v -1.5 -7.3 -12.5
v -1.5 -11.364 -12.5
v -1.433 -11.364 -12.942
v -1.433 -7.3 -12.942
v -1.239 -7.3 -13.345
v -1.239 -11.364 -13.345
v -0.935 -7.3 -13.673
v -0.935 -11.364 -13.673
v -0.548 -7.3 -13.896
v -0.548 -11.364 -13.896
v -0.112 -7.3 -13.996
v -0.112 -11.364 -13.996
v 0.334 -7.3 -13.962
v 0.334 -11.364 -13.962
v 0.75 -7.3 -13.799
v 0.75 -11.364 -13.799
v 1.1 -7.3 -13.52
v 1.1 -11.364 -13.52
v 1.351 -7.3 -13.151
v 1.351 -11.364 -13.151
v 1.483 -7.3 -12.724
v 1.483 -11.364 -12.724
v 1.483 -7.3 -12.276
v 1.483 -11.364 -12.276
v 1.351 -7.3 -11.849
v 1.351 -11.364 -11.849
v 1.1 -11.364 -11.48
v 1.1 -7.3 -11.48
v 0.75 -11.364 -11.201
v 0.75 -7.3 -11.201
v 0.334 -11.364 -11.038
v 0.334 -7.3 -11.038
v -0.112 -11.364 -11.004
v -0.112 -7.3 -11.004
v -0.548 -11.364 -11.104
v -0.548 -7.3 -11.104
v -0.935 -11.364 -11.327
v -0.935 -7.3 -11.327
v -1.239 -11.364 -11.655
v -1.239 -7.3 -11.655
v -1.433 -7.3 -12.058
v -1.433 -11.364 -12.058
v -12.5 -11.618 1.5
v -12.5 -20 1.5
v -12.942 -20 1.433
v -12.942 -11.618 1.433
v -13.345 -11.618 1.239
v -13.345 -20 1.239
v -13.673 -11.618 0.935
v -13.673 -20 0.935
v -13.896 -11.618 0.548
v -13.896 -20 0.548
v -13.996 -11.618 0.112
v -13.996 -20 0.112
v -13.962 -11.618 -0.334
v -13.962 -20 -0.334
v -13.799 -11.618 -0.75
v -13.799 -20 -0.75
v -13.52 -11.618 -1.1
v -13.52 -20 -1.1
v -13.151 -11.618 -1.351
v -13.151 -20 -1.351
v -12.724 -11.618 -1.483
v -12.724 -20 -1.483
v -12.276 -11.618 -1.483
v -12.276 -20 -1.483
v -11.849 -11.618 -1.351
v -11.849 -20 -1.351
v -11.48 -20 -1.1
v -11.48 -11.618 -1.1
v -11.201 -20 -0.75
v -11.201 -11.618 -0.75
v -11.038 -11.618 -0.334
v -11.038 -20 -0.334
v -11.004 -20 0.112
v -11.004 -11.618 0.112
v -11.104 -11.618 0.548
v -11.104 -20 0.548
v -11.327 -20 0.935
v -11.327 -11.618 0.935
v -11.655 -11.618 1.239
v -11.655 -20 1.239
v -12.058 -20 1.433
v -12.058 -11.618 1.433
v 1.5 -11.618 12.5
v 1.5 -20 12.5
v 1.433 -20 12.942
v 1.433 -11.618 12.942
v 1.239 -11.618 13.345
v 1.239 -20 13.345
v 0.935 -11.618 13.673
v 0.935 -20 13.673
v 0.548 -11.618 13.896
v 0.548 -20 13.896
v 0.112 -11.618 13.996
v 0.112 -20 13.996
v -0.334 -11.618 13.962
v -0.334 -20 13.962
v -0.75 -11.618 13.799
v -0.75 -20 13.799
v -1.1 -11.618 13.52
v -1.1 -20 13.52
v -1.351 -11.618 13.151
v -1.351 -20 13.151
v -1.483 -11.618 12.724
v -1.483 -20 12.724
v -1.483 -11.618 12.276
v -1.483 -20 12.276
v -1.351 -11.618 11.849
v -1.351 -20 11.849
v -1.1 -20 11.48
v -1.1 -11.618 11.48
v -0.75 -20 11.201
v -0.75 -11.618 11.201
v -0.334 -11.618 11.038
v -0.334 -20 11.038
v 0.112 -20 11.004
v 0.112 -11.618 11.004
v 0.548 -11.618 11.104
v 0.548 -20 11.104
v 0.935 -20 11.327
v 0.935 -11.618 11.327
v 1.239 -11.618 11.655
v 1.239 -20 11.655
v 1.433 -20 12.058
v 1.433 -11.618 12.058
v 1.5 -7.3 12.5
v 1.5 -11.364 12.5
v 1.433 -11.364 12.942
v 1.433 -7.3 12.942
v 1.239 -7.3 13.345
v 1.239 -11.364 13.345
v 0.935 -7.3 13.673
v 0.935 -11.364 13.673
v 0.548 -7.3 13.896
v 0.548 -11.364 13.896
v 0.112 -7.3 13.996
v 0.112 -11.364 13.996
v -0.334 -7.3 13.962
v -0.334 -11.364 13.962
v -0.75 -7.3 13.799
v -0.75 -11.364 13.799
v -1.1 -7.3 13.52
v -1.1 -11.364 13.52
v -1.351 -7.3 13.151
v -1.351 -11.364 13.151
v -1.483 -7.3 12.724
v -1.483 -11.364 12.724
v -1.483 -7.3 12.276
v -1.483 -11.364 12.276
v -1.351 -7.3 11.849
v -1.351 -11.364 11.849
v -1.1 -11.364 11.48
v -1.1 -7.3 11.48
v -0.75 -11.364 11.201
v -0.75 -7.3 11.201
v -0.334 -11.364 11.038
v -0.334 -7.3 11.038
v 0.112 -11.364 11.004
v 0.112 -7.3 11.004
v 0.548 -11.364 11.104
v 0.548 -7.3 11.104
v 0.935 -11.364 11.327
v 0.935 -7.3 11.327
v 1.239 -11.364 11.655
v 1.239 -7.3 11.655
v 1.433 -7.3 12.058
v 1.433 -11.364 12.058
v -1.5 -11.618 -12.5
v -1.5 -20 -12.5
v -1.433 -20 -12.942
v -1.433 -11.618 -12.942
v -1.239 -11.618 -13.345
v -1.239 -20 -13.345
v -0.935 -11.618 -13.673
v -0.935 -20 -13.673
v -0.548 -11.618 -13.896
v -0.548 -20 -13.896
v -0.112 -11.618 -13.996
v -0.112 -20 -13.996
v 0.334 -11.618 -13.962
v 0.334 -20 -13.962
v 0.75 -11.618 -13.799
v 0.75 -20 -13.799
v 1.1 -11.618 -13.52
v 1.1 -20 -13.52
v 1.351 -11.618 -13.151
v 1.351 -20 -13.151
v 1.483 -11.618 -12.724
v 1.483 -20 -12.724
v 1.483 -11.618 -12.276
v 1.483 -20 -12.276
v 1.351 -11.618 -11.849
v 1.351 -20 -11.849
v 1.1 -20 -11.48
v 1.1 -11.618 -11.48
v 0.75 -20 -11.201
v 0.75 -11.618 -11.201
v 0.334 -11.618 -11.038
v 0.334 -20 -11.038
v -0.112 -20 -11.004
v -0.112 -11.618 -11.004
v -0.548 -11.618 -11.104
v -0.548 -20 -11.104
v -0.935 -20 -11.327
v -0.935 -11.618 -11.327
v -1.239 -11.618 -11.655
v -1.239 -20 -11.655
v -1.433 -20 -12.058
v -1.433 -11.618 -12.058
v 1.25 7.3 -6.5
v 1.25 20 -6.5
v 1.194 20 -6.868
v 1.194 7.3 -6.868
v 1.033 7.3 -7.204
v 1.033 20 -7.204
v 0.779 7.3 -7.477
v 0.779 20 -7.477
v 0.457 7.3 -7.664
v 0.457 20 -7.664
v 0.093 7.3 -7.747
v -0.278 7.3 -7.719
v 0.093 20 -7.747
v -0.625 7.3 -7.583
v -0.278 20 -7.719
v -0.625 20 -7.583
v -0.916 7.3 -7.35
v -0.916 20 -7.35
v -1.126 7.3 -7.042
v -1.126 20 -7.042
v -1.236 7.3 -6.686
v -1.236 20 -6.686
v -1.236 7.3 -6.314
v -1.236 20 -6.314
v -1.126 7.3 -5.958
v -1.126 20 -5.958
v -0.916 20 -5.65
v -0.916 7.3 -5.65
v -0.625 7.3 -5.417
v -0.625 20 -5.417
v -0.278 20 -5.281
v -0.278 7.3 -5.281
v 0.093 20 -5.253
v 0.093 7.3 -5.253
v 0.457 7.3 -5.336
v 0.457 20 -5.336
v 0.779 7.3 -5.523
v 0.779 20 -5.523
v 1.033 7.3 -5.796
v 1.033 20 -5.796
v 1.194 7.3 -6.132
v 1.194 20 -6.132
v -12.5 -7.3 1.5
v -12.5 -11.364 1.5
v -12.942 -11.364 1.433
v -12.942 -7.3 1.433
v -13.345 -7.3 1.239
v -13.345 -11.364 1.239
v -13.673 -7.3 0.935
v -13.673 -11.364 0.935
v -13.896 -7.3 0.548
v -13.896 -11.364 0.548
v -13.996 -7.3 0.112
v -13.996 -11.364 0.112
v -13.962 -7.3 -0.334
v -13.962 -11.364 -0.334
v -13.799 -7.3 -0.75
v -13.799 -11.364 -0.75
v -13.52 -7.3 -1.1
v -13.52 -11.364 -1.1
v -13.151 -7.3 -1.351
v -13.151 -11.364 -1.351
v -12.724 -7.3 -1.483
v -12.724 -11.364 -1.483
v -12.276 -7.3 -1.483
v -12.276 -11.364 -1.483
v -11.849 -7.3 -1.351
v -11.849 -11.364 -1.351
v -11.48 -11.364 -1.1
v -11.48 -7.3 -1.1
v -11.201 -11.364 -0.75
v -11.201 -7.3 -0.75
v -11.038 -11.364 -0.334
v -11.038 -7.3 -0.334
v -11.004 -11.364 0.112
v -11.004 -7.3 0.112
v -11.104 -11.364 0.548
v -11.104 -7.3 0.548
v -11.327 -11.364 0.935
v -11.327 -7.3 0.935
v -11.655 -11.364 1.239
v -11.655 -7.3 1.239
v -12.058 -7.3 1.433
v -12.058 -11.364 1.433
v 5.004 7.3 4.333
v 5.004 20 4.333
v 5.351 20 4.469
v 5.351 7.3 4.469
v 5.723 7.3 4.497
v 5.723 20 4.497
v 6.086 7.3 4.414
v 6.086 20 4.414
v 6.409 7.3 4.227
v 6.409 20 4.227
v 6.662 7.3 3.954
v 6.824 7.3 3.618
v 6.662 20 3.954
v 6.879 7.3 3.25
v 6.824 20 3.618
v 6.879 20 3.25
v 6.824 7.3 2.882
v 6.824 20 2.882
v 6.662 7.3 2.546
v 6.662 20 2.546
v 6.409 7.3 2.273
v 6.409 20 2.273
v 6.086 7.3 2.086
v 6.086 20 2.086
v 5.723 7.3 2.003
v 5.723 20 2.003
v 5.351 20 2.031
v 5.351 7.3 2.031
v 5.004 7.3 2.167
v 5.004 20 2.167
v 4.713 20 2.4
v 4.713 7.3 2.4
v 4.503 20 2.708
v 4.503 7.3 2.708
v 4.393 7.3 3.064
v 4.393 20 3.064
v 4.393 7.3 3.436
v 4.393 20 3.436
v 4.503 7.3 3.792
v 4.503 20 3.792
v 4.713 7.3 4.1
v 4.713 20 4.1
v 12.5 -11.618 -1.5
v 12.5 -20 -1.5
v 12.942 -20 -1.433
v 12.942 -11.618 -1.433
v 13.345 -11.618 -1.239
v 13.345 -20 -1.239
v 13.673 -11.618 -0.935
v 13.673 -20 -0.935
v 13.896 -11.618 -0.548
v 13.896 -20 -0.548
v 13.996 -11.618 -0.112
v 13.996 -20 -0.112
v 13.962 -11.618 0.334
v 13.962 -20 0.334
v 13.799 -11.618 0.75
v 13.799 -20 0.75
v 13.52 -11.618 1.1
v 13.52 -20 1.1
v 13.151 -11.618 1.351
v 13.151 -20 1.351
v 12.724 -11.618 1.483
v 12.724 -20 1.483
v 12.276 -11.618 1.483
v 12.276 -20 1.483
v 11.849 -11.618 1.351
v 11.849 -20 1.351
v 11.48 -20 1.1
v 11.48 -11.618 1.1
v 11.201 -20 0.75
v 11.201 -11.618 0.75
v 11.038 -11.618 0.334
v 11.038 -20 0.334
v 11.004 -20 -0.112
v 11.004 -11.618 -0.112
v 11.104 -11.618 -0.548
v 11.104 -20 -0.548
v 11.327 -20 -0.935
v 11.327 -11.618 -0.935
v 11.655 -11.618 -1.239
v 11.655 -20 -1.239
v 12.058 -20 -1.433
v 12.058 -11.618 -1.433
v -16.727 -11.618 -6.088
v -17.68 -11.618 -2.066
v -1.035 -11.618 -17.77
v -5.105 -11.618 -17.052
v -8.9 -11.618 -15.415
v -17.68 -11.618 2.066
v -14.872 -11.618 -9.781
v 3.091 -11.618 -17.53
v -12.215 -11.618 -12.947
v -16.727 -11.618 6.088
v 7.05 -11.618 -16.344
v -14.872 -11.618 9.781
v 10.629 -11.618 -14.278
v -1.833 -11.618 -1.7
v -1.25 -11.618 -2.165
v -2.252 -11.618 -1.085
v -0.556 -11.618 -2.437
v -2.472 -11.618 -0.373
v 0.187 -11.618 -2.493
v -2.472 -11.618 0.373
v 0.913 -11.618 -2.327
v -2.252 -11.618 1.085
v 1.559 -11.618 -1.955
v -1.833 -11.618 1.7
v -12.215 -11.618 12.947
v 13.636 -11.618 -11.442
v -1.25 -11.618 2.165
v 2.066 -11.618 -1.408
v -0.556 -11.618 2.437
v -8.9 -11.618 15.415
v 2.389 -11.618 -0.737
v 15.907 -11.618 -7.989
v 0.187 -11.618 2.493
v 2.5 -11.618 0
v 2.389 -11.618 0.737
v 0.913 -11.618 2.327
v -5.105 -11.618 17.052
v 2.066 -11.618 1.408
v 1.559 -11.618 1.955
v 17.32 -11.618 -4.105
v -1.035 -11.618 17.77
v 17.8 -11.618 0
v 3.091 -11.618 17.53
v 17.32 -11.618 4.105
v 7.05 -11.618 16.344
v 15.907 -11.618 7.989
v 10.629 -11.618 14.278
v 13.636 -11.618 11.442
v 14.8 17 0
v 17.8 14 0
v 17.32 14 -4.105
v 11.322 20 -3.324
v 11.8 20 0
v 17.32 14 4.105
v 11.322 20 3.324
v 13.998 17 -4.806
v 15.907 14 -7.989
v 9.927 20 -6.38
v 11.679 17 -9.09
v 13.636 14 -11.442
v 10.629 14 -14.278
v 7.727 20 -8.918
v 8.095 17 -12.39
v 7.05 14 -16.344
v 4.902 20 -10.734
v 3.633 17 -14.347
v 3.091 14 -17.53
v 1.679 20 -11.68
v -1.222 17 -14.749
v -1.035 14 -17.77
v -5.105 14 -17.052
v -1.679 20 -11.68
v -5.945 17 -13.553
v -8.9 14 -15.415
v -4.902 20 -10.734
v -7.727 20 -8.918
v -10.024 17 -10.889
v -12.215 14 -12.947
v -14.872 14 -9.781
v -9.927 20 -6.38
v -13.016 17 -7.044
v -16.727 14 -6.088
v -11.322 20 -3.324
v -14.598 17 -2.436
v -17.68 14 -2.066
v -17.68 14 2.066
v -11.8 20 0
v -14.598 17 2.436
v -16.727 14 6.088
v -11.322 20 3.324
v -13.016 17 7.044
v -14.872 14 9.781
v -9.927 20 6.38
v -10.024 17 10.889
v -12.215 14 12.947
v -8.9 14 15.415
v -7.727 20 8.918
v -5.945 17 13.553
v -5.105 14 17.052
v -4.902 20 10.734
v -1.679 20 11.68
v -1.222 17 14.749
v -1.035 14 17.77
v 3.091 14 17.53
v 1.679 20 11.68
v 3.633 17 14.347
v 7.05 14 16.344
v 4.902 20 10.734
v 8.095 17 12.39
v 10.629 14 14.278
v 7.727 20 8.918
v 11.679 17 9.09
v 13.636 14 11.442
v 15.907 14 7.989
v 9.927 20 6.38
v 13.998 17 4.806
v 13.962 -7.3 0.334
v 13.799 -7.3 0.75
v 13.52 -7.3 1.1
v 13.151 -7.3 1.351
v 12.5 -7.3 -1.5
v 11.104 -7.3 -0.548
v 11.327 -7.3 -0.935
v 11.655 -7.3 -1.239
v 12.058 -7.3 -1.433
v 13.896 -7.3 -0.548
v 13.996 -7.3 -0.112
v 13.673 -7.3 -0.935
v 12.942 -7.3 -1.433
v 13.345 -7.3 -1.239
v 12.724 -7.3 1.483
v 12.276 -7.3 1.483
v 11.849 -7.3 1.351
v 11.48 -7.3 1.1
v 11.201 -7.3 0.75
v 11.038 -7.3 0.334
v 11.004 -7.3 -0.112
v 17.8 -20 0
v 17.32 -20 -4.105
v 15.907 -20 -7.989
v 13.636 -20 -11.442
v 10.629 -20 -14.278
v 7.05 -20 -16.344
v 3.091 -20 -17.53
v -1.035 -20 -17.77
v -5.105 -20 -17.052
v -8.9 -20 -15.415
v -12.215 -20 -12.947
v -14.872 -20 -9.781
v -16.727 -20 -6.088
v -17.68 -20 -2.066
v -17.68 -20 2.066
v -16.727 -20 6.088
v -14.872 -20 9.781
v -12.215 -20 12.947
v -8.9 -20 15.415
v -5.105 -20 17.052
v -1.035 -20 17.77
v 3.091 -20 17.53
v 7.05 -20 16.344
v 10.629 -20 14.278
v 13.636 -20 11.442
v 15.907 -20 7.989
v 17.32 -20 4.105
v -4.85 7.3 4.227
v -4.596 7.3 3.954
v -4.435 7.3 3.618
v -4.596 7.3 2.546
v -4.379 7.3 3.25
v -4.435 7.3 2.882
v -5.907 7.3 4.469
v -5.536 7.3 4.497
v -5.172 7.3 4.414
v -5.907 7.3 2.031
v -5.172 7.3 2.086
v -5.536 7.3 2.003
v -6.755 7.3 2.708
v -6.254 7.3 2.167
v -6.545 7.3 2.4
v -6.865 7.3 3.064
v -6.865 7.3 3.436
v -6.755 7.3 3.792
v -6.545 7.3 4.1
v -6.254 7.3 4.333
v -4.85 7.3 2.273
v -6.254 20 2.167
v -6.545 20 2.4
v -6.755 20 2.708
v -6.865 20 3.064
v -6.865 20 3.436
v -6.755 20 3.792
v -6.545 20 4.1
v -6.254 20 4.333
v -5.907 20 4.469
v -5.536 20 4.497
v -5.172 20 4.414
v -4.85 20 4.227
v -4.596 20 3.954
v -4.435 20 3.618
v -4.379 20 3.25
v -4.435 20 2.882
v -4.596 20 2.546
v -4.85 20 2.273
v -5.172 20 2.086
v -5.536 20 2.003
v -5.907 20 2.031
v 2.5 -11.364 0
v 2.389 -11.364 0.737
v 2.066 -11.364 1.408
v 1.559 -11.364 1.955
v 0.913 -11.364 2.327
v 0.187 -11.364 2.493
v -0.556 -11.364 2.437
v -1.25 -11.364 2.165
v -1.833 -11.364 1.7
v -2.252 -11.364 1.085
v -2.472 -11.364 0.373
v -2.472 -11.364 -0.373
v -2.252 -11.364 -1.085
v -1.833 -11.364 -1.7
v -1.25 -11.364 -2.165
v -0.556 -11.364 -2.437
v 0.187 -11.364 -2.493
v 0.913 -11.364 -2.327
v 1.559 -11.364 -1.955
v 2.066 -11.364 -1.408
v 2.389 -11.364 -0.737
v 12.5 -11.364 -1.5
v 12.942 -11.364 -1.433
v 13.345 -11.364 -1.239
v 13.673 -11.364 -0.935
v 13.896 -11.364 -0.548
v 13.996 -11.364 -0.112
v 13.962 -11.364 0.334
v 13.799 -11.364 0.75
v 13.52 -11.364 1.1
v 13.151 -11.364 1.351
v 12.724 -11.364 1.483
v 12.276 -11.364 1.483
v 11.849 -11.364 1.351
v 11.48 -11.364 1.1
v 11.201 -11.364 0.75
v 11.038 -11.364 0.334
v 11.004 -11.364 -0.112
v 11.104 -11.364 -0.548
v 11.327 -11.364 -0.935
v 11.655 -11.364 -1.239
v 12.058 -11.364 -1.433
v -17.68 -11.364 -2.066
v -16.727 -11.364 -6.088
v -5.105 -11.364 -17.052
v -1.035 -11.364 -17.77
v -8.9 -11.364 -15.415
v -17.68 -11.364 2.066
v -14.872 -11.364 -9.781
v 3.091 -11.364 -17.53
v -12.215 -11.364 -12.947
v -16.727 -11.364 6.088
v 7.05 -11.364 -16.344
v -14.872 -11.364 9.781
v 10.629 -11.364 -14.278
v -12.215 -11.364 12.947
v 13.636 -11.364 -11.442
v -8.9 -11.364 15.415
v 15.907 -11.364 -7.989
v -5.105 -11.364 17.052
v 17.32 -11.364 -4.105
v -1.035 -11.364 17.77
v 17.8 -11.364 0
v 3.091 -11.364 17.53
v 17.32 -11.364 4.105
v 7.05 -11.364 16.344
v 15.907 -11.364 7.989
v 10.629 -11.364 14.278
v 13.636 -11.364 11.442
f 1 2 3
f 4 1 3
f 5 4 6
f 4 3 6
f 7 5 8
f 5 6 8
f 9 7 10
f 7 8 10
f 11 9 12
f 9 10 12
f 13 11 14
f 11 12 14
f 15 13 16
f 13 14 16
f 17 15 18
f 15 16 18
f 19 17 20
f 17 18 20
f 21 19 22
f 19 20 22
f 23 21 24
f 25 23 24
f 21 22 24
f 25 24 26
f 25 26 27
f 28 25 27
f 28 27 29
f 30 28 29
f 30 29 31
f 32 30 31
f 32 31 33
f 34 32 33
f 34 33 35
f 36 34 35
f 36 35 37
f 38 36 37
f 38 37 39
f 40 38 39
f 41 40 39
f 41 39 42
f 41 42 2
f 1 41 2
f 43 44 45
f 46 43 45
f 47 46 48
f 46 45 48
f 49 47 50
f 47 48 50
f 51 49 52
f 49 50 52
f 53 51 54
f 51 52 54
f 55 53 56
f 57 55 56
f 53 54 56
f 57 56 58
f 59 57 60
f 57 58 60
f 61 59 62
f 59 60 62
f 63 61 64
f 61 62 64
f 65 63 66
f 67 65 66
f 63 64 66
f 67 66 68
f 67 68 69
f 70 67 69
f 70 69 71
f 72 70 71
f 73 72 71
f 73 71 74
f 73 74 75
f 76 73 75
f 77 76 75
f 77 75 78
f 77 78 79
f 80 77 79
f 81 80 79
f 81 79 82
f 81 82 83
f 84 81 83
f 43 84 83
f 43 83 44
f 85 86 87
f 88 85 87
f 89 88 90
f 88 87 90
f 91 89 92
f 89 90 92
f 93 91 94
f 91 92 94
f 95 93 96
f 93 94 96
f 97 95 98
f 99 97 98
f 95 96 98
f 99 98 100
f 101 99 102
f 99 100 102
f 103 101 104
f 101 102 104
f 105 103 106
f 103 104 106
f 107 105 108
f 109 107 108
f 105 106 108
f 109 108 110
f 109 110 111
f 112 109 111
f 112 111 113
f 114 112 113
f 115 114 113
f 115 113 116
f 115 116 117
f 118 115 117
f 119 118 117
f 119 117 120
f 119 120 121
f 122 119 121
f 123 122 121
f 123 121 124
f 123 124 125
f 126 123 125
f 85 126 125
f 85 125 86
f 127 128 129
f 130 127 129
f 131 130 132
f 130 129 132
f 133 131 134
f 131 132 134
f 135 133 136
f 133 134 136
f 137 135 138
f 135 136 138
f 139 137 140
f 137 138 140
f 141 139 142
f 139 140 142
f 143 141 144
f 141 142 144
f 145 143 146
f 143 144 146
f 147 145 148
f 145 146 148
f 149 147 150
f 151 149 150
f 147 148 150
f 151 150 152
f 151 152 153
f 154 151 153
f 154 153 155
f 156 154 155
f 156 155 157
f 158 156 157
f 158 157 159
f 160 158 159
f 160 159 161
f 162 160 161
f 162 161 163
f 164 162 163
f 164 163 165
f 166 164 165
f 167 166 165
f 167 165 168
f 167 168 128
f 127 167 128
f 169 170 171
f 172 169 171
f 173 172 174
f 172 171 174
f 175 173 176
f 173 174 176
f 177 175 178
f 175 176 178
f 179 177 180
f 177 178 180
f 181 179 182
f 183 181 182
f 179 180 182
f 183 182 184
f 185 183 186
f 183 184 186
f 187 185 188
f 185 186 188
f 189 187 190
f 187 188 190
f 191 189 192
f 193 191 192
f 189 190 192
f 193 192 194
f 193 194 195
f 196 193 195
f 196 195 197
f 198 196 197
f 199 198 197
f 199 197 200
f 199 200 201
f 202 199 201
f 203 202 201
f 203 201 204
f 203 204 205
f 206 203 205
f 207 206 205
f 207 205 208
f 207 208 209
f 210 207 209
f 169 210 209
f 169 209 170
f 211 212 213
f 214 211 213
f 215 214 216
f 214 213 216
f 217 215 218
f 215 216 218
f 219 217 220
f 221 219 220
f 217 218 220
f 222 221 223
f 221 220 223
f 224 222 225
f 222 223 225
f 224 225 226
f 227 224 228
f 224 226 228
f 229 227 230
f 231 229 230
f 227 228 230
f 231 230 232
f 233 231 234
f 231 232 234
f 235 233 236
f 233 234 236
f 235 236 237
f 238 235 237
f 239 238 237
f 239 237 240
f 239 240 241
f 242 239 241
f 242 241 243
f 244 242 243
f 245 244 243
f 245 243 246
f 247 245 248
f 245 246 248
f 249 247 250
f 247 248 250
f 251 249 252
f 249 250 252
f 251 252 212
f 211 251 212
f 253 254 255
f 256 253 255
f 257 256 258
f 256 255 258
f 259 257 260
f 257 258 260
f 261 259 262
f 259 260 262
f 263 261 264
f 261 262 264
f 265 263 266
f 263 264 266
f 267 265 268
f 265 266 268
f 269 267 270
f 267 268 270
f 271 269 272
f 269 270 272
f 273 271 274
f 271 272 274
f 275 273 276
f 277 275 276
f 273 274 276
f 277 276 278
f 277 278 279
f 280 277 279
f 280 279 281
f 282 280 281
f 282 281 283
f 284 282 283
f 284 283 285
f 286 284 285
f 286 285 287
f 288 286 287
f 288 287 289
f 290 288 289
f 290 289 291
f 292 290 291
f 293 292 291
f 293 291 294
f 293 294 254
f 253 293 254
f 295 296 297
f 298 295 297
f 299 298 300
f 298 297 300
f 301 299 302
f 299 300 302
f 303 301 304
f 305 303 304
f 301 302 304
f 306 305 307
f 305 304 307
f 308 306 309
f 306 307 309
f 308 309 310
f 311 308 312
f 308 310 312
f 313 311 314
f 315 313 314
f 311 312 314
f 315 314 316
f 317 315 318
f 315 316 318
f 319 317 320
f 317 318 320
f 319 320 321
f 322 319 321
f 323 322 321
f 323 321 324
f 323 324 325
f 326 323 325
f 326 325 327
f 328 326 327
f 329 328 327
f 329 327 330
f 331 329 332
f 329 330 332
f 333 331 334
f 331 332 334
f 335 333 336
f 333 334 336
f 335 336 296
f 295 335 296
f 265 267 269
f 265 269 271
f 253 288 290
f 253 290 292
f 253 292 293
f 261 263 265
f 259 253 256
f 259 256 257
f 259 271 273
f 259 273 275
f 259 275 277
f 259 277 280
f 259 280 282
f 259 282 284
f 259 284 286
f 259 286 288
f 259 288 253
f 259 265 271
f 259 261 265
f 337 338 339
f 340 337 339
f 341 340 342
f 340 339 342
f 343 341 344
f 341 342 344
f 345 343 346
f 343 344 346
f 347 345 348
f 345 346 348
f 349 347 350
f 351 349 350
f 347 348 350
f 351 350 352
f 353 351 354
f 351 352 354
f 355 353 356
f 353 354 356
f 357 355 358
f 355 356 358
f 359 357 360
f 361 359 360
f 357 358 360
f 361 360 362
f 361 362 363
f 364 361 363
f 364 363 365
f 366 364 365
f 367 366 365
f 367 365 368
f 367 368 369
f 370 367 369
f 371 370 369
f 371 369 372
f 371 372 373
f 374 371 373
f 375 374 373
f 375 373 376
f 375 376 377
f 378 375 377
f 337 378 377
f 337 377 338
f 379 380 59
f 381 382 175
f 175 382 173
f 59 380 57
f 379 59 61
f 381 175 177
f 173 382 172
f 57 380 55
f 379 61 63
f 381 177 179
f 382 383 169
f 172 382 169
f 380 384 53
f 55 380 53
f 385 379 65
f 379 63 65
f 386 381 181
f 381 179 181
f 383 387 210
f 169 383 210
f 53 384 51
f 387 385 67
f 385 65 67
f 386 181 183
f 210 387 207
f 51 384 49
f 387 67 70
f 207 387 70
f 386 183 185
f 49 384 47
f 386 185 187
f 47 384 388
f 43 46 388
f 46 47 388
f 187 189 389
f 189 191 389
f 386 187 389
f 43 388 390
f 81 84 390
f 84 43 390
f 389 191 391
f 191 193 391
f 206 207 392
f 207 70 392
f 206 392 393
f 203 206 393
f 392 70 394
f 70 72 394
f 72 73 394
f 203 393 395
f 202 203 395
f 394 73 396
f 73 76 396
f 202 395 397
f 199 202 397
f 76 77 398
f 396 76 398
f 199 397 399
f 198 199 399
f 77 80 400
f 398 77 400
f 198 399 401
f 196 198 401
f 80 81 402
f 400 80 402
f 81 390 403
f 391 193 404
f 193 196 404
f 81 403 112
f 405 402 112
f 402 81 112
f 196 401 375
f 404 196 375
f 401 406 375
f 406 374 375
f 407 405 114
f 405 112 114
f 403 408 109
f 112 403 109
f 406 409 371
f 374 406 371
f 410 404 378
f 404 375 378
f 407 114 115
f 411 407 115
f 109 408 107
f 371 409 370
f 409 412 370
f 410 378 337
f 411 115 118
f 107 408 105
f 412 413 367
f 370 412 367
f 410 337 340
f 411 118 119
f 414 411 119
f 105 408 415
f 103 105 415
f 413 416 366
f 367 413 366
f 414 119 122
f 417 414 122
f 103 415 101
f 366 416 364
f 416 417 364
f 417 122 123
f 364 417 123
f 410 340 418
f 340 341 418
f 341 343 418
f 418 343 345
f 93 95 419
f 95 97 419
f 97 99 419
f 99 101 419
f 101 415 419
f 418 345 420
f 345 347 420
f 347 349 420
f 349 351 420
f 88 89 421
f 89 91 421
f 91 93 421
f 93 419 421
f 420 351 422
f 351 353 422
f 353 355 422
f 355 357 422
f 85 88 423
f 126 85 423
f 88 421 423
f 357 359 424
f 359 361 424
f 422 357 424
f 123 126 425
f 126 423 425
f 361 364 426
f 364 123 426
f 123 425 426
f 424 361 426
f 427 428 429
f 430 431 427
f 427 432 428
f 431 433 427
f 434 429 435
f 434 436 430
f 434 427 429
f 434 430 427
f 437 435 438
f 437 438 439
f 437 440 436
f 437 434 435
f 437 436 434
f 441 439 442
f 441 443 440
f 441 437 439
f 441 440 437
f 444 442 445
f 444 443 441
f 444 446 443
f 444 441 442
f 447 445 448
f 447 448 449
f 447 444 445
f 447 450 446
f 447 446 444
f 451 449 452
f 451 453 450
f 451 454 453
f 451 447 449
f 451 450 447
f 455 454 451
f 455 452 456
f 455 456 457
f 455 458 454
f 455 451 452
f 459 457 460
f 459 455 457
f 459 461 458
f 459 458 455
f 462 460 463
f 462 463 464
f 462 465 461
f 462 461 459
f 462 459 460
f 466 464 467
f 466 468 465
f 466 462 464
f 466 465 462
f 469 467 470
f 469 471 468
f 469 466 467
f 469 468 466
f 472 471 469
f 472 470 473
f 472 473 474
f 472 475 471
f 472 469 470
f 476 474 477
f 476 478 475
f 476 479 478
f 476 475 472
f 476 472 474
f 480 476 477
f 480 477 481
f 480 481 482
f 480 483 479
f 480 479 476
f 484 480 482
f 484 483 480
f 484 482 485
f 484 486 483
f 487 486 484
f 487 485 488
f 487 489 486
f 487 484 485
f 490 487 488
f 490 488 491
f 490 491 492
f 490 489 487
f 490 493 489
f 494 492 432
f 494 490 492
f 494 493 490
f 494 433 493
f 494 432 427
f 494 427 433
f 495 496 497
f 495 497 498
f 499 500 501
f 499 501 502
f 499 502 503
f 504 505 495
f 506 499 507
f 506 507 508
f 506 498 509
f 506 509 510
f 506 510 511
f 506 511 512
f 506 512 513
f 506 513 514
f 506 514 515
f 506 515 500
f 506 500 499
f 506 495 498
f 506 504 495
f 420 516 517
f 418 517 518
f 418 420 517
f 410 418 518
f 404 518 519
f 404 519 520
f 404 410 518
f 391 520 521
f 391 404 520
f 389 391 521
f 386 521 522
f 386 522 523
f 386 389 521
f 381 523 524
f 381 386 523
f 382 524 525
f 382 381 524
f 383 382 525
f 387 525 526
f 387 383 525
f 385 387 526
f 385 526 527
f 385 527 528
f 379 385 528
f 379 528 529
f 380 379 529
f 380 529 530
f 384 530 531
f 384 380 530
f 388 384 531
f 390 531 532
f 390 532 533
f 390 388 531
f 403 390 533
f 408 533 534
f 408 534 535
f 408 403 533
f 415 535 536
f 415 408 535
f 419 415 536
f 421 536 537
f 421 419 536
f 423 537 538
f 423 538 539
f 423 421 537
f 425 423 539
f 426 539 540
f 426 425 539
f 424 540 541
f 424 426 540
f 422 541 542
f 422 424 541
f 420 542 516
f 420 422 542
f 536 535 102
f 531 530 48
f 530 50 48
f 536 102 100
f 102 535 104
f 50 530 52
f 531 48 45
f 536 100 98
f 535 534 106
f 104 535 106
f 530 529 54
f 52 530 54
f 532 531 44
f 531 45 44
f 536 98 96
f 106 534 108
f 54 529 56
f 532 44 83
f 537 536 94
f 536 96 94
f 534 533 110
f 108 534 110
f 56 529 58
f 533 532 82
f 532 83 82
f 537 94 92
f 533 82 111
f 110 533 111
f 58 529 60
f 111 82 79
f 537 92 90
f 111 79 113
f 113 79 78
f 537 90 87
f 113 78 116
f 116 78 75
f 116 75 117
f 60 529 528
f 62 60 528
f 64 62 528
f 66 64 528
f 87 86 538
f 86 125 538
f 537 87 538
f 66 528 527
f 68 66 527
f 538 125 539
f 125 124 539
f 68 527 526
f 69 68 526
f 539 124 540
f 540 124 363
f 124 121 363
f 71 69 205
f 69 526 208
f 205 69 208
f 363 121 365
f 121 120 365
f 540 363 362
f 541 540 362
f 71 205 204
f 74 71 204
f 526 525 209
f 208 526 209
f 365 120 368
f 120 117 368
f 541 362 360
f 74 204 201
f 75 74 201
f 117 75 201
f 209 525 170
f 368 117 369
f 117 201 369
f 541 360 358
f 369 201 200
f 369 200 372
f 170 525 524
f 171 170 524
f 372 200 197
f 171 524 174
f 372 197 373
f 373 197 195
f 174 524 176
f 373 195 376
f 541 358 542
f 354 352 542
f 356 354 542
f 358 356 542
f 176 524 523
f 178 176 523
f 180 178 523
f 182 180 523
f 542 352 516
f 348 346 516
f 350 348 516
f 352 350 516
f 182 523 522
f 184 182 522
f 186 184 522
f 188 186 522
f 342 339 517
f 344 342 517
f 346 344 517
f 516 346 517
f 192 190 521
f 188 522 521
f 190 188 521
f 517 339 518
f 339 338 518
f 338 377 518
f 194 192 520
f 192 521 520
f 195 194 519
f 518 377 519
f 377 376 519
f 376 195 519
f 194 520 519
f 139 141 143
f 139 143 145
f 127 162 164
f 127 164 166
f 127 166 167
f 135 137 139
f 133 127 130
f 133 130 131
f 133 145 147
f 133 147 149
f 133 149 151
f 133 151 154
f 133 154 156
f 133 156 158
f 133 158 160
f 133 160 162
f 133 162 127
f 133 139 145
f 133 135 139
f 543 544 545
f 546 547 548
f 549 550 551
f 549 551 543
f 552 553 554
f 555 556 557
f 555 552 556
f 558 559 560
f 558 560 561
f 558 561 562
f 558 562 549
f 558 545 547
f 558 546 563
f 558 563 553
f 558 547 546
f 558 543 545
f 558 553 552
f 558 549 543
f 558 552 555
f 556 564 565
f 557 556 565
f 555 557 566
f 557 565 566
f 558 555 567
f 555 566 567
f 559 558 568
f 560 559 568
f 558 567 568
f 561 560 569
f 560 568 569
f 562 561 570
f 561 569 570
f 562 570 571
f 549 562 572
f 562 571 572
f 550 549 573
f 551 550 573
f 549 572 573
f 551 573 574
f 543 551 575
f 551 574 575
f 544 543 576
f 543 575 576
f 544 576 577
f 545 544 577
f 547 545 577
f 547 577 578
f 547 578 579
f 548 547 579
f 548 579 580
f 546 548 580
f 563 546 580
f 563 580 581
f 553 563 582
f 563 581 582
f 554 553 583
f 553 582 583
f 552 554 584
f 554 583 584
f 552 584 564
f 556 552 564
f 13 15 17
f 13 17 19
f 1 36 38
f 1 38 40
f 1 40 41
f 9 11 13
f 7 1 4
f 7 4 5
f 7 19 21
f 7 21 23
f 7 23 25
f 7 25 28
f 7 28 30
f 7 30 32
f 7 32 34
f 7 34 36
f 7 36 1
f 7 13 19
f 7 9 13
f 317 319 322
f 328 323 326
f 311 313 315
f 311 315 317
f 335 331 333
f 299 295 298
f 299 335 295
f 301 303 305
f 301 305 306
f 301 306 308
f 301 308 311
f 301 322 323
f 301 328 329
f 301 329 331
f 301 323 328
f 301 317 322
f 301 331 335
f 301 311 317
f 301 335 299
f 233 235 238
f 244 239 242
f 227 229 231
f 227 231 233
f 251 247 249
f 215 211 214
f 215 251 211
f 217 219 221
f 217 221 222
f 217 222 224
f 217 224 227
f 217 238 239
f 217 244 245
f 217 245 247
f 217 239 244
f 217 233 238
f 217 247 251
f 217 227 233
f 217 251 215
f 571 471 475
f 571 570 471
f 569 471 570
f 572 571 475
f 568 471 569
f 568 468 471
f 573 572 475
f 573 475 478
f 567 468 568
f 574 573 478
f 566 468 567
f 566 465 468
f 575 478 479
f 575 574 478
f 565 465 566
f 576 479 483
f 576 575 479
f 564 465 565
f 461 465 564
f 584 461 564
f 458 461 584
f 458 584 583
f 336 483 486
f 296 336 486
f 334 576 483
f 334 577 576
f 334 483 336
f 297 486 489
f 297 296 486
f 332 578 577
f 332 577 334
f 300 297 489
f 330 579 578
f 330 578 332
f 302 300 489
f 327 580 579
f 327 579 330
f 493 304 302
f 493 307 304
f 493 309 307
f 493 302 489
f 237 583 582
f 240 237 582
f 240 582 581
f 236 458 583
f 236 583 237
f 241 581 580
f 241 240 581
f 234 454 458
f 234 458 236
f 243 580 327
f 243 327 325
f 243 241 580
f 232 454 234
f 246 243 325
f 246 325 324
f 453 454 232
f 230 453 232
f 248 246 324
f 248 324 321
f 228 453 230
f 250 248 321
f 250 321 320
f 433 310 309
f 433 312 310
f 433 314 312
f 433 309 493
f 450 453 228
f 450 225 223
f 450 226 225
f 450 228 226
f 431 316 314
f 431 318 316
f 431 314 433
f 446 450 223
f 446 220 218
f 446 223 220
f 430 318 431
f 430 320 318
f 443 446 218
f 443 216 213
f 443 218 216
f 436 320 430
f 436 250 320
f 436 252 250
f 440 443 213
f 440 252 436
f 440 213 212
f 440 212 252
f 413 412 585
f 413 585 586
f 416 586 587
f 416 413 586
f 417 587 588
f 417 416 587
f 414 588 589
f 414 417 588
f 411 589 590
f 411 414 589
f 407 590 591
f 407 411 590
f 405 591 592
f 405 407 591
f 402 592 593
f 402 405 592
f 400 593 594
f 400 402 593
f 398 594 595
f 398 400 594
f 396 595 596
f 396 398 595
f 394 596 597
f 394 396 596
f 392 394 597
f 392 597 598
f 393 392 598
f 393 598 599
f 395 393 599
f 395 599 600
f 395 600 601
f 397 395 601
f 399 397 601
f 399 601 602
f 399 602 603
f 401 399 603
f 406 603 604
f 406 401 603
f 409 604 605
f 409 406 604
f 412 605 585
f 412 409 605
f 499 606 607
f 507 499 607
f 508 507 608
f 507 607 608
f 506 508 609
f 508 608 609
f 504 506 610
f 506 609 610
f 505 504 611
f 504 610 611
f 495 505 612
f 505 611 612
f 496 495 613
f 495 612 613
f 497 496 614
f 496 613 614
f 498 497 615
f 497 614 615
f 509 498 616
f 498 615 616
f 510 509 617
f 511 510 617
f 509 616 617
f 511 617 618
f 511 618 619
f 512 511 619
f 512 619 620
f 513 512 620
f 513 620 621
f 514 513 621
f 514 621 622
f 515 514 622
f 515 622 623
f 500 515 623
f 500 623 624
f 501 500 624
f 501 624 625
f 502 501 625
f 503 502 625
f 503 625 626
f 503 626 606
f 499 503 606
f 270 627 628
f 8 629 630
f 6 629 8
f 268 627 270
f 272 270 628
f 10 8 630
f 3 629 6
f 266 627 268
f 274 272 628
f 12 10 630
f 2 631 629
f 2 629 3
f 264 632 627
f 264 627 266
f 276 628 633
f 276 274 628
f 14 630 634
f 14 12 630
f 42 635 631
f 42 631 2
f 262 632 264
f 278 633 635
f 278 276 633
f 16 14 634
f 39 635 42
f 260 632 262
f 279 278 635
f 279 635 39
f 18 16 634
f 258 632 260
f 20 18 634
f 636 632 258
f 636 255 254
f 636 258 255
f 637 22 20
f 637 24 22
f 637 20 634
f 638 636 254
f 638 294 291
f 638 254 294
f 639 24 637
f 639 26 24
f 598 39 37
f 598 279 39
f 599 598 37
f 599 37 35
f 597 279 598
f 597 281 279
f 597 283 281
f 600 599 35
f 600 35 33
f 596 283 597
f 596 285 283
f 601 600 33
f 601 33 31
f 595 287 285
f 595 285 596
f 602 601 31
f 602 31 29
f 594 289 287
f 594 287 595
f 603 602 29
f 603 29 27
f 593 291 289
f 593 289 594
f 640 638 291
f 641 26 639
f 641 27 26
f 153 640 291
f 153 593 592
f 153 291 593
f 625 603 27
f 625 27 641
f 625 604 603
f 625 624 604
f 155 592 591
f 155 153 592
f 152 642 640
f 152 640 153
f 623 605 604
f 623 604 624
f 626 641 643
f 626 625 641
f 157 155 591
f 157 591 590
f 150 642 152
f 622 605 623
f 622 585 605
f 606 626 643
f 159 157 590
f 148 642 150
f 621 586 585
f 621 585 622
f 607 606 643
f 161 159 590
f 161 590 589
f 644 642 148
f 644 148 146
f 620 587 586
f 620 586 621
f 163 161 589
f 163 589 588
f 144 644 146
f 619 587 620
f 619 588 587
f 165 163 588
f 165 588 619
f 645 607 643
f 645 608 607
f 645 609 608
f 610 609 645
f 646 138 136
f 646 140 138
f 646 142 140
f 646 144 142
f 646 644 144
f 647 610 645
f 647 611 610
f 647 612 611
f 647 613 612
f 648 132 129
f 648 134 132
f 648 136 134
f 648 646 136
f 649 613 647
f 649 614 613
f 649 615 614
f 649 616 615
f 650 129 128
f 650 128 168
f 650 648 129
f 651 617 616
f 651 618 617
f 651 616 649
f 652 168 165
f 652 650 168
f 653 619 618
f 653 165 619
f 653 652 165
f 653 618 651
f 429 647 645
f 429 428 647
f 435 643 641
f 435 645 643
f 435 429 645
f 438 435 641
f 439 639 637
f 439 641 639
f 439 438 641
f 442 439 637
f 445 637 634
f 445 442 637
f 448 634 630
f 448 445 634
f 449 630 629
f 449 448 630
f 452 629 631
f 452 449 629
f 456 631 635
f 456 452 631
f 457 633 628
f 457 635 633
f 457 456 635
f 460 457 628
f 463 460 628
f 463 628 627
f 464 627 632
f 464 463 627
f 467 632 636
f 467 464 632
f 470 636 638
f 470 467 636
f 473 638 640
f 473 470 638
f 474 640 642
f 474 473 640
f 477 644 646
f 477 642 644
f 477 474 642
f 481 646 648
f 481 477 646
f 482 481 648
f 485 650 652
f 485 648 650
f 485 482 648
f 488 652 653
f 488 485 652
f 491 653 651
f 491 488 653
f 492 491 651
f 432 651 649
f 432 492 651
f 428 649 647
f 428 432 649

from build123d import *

# Parameters (mm, degrees)
SKETCH1_R           = 17.8
BOSS_EXTRUDE1_DEPTH = 20
SKETCH2_R           = 1.25
CUT_EXTRUDE1_DEPTH  = 12.7
CIRPATTERN1_COUNT   = 3
SKETCH3_R           = 1.5
CUT_EXTRUDE2_DEPTH  = 12.7
CIRPATTERN2_COUNT   = 4
CHAMFER1_SIZE       = 6
CUT_EXTRUDE3_START  = -8.382
SKETCH4_R           = 17.8
SKETCH4_R_2         = 2.5
CUT_EXTRUDE3_DEPTH  = 0.254


with BuildPart() as part:
    # Sketch1 → Boss-Extrude1 (new body, symmetric)
    with BuildSketch(Plane(origin=(0, 0, 0), x_dir=(1, 0, 0), z_dir=(0, 1, 0))):
        Circle(SKETCH1_R)
    extrude(amount=BOSS_EXTRUDE1_DEPTH, both=True)

    # Sketch2 → Cut-Extrude1 (cut)
    with BuildSketch(Plane(origin=(0, 20, 0), x_dir=(1, 0, 0), z_dir=(0, 1, 0))):
        with Locations((0, 6.5)):
            Circle(SKETCH2_R)
    cut_extrude1 = extrude(amount=-CUT_EXTRUDE1_DEPTH, mode=Mode.SUBTRACT)

    # CirPattern1: Cut-Extrude1 ×3 about axis
    cirpattern1_axis = Axis((0, 0, 0), (0, 1, 0))
    for i in range(1, CIRPATTERN1_COUNT):
        add(cut_extrude1.rotate(cirpattern1_axis, i * 360 / CIRPATTERN1_COUNT), mode=Mode.SUBTRACT)

    # Sketch3 → Cut-Extrude2 (cut)
    with BuildSketch(Plane.XZ.offset(20)):
        with Locations((0, 12.5)):
            Circle(SKETCH3_R)
    cut_extrude2 = extrude(amount=-CUT_EXTRUDE2_DEPTH, mode=Mode.SUBTRACT)

    # CirPattern2: Cut-Extrude2 ×4 about axis
    cirpattern2_axis = Axis((0, 0, 0), (0, 1, 0))
    for i in range(1, CIRPATTERN2_COUNT):
        add(cut_extrude2.rotate(cirpattern2_axis, i * 360 / CIRPATTERN2_COUNT), mode=Mode.SUBTRACT)

    # Chamfer1
    chamfer1_edges = [part.edges().sort_by_distance(p)[0] for p in [
        (-17.8, 20, 0),
    ]]
    chamfer(chamfer1_edges, length=CHAMFER1_SIZE)

    # Sketch4 → Cut-Extrude3 (cut)
    with BuildSketch(Plane.XZ.offset(20).offset(CUT_EXTRUDE3_START)):
        Circle(SKETCH4_R)
        Circle(SKETCH4_R_2, mode=Mode.SUBTRACT)
    extrude(amount=-CUT_EXTRUDE3_DEPTH, mode=Mode.SUBTRACT)


solid = part.part
